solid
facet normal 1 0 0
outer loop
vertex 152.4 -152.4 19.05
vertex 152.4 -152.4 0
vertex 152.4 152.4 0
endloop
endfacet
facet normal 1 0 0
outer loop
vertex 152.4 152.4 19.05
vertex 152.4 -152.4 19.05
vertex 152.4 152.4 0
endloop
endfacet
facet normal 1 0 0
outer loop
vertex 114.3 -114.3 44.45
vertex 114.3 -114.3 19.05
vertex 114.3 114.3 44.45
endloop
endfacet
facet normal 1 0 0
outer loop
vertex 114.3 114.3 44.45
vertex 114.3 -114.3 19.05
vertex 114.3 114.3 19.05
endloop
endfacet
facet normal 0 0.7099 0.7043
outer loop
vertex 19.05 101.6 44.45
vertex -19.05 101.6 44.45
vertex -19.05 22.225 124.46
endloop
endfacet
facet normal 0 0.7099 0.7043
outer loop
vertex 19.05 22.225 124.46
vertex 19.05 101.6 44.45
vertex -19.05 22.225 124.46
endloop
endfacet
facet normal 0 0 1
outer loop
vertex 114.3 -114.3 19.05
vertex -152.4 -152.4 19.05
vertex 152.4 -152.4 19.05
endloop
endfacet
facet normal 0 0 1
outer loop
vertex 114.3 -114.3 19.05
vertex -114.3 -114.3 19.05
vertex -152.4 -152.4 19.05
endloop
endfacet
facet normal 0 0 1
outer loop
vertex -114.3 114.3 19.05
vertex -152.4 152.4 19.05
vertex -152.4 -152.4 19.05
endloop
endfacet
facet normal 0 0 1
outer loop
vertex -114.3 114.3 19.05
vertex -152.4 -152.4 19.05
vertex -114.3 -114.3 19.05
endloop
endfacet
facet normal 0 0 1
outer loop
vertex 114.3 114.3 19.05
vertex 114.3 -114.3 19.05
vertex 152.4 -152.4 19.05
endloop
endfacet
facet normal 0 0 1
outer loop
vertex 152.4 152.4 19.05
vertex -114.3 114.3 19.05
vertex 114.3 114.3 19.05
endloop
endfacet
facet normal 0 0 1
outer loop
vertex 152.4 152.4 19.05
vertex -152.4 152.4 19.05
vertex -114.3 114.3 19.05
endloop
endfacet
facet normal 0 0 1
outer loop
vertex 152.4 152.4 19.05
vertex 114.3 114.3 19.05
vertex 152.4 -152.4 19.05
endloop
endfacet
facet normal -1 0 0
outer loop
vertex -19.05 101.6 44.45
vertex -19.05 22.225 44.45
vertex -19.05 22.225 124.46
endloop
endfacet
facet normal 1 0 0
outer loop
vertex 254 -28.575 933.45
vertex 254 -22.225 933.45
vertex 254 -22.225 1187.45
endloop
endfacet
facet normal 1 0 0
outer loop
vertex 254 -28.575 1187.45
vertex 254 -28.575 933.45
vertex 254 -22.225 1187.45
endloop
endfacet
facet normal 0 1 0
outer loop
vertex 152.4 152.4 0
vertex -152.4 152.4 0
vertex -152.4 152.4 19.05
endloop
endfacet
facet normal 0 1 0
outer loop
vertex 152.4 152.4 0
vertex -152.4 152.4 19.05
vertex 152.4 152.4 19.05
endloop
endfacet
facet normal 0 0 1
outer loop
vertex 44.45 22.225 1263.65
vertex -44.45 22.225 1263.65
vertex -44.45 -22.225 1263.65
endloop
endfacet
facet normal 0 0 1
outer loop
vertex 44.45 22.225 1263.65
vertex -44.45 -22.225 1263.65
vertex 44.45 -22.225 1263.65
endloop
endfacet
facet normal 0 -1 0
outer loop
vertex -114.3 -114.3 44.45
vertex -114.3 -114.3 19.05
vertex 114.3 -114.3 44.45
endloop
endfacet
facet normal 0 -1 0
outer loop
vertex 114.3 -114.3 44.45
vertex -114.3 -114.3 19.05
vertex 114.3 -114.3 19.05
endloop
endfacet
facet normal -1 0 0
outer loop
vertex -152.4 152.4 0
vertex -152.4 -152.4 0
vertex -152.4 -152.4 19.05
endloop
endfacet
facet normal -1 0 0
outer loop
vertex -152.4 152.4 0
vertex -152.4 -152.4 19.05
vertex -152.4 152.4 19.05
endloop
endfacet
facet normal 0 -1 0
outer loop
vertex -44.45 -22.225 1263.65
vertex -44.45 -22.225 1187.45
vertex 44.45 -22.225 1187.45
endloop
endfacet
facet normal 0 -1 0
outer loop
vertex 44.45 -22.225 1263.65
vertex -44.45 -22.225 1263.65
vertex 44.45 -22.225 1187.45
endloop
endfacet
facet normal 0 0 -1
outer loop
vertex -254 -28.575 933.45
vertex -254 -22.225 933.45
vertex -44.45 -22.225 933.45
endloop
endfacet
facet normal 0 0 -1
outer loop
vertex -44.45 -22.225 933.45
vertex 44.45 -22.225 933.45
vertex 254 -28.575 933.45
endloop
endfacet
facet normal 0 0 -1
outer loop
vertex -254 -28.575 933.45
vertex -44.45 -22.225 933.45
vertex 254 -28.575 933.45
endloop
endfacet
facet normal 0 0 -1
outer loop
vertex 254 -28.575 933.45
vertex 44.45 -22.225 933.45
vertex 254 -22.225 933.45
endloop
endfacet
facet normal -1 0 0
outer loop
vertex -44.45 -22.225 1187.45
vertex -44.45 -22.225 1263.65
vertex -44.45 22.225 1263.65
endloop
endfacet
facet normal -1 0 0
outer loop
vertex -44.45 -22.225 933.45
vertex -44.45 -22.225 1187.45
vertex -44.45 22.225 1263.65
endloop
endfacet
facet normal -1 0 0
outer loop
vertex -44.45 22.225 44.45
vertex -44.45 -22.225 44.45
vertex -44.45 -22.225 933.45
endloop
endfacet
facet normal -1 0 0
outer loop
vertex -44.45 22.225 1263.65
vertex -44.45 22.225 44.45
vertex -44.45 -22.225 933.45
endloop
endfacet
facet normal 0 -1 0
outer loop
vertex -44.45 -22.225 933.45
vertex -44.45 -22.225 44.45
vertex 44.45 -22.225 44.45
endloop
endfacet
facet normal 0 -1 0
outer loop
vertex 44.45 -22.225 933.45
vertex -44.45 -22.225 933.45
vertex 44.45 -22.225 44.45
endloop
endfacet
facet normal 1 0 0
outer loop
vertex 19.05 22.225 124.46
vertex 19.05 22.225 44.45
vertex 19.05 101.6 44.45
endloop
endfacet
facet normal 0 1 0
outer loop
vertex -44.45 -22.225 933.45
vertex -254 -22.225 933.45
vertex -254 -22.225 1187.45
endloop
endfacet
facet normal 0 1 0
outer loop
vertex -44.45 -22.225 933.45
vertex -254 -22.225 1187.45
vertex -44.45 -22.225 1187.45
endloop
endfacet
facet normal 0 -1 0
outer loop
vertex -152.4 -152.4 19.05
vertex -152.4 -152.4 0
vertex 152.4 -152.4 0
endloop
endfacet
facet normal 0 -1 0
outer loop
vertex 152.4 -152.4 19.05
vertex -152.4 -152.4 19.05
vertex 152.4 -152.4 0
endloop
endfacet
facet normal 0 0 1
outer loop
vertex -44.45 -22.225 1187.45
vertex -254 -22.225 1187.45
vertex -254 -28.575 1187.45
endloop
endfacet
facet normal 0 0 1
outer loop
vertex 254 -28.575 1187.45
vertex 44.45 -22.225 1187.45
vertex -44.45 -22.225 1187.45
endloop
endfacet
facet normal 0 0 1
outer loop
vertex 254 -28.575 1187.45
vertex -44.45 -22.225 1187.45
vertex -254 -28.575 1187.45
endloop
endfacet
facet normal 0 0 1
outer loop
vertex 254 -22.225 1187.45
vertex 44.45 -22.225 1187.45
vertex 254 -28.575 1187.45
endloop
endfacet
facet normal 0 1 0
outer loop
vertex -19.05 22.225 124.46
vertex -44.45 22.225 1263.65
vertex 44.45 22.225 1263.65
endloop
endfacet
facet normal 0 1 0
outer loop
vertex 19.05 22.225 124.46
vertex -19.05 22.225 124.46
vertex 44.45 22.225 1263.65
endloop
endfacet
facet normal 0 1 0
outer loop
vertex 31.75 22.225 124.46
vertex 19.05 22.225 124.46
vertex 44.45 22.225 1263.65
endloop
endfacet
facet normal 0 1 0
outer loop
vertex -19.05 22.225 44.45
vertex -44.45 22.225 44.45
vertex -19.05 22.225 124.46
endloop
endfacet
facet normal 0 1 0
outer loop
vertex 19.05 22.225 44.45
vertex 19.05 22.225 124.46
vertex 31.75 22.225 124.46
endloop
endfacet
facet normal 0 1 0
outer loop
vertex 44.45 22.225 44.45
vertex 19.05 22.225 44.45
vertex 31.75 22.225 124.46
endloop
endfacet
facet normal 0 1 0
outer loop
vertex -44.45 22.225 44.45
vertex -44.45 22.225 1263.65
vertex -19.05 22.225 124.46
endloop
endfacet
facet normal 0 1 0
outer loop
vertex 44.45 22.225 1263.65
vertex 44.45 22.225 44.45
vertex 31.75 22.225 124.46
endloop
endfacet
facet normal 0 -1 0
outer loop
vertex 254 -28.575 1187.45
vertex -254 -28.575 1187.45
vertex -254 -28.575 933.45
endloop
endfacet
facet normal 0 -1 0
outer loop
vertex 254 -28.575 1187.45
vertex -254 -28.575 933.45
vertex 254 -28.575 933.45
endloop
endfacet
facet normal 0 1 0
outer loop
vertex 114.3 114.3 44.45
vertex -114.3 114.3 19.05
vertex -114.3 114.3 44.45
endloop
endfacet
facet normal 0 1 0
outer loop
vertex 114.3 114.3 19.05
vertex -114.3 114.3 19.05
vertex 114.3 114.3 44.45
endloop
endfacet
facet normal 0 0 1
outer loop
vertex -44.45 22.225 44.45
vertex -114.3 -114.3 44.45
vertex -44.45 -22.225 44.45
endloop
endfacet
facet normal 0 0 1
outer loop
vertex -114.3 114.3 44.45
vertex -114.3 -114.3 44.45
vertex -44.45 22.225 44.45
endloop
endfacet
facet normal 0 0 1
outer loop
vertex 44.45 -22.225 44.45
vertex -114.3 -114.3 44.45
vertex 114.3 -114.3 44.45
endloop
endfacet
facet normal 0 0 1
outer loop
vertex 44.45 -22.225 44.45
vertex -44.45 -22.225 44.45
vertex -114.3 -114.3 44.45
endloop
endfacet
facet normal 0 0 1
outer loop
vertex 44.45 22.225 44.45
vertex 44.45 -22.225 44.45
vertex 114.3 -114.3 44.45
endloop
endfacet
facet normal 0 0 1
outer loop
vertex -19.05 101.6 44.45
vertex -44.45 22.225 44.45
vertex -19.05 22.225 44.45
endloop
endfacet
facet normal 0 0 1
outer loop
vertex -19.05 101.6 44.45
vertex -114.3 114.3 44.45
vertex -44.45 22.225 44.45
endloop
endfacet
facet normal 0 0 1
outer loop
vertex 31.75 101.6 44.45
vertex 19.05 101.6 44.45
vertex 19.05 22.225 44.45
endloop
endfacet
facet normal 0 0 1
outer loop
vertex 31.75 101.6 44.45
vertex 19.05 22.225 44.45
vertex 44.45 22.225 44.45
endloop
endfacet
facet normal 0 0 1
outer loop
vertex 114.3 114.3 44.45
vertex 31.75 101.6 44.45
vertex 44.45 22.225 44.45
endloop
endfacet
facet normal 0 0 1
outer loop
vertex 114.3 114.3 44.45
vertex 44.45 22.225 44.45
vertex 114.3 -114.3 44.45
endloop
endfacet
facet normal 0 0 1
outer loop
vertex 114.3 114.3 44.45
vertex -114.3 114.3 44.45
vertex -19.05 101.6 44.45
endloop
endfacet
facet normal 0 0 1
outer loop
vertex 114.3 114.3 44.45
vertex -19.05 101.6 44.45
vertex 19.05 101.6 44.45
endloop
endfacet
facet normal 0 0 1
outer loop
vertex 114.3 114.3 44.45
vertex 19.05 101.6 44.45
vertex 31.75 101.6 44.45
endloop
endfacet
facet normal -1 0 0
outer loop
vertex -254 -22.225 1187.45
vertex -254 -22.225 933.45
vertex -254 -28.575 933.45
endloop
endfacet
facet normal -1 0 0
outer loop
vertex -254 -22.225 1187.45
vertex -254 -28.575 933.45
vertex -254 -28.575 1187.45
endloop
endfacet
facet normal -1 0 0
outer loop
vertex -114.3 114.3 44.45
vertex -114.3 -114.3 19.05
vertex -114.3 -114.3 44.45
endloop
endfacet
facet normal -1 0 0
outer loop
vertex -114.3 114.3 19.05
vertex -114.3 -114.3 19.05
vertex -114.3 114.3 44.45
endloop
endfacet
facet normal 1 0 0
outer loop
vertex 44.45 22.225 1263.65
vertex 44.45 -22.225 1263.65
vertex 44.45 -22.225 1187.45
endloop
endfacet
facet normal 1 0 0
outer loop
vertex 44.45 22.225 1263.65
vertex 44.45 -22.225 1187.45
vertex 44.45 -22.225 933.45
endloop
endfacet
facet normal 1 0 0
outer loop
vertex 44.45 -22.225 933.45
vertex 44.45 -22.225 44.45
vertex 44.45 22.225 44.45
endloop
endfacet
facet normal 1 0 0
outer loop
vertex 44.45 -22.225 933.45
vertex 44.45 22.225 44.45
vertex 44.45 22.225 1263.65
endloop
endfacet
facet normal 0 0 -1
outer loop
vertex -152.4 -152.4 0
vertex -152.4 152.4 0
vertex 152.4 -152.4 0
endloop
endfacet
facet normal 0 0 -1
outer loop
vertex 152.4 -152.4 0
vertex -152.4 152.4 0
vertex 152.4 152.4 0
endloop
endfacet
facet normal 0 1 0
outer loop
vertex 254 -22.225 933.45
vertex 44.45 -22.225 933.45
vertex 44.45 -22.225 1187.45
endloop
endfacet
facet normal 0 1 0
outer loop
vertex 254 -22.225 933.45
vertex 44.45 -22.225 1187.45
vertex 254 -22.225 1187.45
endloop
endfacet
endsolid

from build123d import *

# Parameters (mm, degrees)
F0_W      = 304.8
F0_H      = 304.8
F1_DEPTH  = 19.05
F2_W      = 228.6
F2_H      = 228.6
F3_DEPTH  = 25.4
F4_W      = 88.9
F4_H      = 44.45
F5_DEPTH  = 1219.2
F6_W      = 38.1
F6_H      = 79.375
F7_DEPTH  = 80.01
F9_DEPTH  = 50.8
F10_W     = 508
F10_H     = 254
F11_DEPTH = 6.35


with BuildPart() as f1:
    # F0 (on Top) → F1 (new body)
    with BuildSketch(Plane.XY):
        Rectangle(F0_W, F0_H)
    extrude(amount=F1_DEPTH)

    # F2 (on face) → F3 (join)
    with BuildSketch(Plane.XY.offset(19.05)):
        Rectangle(F2_W, F2_H)
    extrude(amount=F3_DEPTH)

    # F4 (on face) → F5 (join)
    with BuildSketch(Plane.XY.offset(44.45)):
        Rectangle(F4_W, F4_H)
    extrude(amount=F5_DEPTH)

    # F6 (on face) → F7 (join)
    with BuildSketch(Plane.XY.offset(44.45)):
        with Locations((0, 61.9125)):
            Rectangle(F6_W, F6_H)
    extrude(amount=F7_DEPTH)

    # F8 (on face) → F9 (cut)
    with BuildSketch(Plane(origin=(-19.05, 0, 0), x_dir=(0, -1, 0), z_dir=(-1, 0, 0))):
        Polygon((-101.6, 124.46), (-101.6, 44.45), (-22.225, 124.46), align=None)
    extrude(amount=-F9_DEPTH, mode=Mode.SUBTRACT)

    # F10 (on face) → F11 (join)
    with BuildSketch(Plane.XZ.offset(22.225)):
        with Locations((0, 1060.45)):
            Rectangle(F10_W, F10_H)
    extrude(amount=F11_DEPTH)


solid = f1.part
